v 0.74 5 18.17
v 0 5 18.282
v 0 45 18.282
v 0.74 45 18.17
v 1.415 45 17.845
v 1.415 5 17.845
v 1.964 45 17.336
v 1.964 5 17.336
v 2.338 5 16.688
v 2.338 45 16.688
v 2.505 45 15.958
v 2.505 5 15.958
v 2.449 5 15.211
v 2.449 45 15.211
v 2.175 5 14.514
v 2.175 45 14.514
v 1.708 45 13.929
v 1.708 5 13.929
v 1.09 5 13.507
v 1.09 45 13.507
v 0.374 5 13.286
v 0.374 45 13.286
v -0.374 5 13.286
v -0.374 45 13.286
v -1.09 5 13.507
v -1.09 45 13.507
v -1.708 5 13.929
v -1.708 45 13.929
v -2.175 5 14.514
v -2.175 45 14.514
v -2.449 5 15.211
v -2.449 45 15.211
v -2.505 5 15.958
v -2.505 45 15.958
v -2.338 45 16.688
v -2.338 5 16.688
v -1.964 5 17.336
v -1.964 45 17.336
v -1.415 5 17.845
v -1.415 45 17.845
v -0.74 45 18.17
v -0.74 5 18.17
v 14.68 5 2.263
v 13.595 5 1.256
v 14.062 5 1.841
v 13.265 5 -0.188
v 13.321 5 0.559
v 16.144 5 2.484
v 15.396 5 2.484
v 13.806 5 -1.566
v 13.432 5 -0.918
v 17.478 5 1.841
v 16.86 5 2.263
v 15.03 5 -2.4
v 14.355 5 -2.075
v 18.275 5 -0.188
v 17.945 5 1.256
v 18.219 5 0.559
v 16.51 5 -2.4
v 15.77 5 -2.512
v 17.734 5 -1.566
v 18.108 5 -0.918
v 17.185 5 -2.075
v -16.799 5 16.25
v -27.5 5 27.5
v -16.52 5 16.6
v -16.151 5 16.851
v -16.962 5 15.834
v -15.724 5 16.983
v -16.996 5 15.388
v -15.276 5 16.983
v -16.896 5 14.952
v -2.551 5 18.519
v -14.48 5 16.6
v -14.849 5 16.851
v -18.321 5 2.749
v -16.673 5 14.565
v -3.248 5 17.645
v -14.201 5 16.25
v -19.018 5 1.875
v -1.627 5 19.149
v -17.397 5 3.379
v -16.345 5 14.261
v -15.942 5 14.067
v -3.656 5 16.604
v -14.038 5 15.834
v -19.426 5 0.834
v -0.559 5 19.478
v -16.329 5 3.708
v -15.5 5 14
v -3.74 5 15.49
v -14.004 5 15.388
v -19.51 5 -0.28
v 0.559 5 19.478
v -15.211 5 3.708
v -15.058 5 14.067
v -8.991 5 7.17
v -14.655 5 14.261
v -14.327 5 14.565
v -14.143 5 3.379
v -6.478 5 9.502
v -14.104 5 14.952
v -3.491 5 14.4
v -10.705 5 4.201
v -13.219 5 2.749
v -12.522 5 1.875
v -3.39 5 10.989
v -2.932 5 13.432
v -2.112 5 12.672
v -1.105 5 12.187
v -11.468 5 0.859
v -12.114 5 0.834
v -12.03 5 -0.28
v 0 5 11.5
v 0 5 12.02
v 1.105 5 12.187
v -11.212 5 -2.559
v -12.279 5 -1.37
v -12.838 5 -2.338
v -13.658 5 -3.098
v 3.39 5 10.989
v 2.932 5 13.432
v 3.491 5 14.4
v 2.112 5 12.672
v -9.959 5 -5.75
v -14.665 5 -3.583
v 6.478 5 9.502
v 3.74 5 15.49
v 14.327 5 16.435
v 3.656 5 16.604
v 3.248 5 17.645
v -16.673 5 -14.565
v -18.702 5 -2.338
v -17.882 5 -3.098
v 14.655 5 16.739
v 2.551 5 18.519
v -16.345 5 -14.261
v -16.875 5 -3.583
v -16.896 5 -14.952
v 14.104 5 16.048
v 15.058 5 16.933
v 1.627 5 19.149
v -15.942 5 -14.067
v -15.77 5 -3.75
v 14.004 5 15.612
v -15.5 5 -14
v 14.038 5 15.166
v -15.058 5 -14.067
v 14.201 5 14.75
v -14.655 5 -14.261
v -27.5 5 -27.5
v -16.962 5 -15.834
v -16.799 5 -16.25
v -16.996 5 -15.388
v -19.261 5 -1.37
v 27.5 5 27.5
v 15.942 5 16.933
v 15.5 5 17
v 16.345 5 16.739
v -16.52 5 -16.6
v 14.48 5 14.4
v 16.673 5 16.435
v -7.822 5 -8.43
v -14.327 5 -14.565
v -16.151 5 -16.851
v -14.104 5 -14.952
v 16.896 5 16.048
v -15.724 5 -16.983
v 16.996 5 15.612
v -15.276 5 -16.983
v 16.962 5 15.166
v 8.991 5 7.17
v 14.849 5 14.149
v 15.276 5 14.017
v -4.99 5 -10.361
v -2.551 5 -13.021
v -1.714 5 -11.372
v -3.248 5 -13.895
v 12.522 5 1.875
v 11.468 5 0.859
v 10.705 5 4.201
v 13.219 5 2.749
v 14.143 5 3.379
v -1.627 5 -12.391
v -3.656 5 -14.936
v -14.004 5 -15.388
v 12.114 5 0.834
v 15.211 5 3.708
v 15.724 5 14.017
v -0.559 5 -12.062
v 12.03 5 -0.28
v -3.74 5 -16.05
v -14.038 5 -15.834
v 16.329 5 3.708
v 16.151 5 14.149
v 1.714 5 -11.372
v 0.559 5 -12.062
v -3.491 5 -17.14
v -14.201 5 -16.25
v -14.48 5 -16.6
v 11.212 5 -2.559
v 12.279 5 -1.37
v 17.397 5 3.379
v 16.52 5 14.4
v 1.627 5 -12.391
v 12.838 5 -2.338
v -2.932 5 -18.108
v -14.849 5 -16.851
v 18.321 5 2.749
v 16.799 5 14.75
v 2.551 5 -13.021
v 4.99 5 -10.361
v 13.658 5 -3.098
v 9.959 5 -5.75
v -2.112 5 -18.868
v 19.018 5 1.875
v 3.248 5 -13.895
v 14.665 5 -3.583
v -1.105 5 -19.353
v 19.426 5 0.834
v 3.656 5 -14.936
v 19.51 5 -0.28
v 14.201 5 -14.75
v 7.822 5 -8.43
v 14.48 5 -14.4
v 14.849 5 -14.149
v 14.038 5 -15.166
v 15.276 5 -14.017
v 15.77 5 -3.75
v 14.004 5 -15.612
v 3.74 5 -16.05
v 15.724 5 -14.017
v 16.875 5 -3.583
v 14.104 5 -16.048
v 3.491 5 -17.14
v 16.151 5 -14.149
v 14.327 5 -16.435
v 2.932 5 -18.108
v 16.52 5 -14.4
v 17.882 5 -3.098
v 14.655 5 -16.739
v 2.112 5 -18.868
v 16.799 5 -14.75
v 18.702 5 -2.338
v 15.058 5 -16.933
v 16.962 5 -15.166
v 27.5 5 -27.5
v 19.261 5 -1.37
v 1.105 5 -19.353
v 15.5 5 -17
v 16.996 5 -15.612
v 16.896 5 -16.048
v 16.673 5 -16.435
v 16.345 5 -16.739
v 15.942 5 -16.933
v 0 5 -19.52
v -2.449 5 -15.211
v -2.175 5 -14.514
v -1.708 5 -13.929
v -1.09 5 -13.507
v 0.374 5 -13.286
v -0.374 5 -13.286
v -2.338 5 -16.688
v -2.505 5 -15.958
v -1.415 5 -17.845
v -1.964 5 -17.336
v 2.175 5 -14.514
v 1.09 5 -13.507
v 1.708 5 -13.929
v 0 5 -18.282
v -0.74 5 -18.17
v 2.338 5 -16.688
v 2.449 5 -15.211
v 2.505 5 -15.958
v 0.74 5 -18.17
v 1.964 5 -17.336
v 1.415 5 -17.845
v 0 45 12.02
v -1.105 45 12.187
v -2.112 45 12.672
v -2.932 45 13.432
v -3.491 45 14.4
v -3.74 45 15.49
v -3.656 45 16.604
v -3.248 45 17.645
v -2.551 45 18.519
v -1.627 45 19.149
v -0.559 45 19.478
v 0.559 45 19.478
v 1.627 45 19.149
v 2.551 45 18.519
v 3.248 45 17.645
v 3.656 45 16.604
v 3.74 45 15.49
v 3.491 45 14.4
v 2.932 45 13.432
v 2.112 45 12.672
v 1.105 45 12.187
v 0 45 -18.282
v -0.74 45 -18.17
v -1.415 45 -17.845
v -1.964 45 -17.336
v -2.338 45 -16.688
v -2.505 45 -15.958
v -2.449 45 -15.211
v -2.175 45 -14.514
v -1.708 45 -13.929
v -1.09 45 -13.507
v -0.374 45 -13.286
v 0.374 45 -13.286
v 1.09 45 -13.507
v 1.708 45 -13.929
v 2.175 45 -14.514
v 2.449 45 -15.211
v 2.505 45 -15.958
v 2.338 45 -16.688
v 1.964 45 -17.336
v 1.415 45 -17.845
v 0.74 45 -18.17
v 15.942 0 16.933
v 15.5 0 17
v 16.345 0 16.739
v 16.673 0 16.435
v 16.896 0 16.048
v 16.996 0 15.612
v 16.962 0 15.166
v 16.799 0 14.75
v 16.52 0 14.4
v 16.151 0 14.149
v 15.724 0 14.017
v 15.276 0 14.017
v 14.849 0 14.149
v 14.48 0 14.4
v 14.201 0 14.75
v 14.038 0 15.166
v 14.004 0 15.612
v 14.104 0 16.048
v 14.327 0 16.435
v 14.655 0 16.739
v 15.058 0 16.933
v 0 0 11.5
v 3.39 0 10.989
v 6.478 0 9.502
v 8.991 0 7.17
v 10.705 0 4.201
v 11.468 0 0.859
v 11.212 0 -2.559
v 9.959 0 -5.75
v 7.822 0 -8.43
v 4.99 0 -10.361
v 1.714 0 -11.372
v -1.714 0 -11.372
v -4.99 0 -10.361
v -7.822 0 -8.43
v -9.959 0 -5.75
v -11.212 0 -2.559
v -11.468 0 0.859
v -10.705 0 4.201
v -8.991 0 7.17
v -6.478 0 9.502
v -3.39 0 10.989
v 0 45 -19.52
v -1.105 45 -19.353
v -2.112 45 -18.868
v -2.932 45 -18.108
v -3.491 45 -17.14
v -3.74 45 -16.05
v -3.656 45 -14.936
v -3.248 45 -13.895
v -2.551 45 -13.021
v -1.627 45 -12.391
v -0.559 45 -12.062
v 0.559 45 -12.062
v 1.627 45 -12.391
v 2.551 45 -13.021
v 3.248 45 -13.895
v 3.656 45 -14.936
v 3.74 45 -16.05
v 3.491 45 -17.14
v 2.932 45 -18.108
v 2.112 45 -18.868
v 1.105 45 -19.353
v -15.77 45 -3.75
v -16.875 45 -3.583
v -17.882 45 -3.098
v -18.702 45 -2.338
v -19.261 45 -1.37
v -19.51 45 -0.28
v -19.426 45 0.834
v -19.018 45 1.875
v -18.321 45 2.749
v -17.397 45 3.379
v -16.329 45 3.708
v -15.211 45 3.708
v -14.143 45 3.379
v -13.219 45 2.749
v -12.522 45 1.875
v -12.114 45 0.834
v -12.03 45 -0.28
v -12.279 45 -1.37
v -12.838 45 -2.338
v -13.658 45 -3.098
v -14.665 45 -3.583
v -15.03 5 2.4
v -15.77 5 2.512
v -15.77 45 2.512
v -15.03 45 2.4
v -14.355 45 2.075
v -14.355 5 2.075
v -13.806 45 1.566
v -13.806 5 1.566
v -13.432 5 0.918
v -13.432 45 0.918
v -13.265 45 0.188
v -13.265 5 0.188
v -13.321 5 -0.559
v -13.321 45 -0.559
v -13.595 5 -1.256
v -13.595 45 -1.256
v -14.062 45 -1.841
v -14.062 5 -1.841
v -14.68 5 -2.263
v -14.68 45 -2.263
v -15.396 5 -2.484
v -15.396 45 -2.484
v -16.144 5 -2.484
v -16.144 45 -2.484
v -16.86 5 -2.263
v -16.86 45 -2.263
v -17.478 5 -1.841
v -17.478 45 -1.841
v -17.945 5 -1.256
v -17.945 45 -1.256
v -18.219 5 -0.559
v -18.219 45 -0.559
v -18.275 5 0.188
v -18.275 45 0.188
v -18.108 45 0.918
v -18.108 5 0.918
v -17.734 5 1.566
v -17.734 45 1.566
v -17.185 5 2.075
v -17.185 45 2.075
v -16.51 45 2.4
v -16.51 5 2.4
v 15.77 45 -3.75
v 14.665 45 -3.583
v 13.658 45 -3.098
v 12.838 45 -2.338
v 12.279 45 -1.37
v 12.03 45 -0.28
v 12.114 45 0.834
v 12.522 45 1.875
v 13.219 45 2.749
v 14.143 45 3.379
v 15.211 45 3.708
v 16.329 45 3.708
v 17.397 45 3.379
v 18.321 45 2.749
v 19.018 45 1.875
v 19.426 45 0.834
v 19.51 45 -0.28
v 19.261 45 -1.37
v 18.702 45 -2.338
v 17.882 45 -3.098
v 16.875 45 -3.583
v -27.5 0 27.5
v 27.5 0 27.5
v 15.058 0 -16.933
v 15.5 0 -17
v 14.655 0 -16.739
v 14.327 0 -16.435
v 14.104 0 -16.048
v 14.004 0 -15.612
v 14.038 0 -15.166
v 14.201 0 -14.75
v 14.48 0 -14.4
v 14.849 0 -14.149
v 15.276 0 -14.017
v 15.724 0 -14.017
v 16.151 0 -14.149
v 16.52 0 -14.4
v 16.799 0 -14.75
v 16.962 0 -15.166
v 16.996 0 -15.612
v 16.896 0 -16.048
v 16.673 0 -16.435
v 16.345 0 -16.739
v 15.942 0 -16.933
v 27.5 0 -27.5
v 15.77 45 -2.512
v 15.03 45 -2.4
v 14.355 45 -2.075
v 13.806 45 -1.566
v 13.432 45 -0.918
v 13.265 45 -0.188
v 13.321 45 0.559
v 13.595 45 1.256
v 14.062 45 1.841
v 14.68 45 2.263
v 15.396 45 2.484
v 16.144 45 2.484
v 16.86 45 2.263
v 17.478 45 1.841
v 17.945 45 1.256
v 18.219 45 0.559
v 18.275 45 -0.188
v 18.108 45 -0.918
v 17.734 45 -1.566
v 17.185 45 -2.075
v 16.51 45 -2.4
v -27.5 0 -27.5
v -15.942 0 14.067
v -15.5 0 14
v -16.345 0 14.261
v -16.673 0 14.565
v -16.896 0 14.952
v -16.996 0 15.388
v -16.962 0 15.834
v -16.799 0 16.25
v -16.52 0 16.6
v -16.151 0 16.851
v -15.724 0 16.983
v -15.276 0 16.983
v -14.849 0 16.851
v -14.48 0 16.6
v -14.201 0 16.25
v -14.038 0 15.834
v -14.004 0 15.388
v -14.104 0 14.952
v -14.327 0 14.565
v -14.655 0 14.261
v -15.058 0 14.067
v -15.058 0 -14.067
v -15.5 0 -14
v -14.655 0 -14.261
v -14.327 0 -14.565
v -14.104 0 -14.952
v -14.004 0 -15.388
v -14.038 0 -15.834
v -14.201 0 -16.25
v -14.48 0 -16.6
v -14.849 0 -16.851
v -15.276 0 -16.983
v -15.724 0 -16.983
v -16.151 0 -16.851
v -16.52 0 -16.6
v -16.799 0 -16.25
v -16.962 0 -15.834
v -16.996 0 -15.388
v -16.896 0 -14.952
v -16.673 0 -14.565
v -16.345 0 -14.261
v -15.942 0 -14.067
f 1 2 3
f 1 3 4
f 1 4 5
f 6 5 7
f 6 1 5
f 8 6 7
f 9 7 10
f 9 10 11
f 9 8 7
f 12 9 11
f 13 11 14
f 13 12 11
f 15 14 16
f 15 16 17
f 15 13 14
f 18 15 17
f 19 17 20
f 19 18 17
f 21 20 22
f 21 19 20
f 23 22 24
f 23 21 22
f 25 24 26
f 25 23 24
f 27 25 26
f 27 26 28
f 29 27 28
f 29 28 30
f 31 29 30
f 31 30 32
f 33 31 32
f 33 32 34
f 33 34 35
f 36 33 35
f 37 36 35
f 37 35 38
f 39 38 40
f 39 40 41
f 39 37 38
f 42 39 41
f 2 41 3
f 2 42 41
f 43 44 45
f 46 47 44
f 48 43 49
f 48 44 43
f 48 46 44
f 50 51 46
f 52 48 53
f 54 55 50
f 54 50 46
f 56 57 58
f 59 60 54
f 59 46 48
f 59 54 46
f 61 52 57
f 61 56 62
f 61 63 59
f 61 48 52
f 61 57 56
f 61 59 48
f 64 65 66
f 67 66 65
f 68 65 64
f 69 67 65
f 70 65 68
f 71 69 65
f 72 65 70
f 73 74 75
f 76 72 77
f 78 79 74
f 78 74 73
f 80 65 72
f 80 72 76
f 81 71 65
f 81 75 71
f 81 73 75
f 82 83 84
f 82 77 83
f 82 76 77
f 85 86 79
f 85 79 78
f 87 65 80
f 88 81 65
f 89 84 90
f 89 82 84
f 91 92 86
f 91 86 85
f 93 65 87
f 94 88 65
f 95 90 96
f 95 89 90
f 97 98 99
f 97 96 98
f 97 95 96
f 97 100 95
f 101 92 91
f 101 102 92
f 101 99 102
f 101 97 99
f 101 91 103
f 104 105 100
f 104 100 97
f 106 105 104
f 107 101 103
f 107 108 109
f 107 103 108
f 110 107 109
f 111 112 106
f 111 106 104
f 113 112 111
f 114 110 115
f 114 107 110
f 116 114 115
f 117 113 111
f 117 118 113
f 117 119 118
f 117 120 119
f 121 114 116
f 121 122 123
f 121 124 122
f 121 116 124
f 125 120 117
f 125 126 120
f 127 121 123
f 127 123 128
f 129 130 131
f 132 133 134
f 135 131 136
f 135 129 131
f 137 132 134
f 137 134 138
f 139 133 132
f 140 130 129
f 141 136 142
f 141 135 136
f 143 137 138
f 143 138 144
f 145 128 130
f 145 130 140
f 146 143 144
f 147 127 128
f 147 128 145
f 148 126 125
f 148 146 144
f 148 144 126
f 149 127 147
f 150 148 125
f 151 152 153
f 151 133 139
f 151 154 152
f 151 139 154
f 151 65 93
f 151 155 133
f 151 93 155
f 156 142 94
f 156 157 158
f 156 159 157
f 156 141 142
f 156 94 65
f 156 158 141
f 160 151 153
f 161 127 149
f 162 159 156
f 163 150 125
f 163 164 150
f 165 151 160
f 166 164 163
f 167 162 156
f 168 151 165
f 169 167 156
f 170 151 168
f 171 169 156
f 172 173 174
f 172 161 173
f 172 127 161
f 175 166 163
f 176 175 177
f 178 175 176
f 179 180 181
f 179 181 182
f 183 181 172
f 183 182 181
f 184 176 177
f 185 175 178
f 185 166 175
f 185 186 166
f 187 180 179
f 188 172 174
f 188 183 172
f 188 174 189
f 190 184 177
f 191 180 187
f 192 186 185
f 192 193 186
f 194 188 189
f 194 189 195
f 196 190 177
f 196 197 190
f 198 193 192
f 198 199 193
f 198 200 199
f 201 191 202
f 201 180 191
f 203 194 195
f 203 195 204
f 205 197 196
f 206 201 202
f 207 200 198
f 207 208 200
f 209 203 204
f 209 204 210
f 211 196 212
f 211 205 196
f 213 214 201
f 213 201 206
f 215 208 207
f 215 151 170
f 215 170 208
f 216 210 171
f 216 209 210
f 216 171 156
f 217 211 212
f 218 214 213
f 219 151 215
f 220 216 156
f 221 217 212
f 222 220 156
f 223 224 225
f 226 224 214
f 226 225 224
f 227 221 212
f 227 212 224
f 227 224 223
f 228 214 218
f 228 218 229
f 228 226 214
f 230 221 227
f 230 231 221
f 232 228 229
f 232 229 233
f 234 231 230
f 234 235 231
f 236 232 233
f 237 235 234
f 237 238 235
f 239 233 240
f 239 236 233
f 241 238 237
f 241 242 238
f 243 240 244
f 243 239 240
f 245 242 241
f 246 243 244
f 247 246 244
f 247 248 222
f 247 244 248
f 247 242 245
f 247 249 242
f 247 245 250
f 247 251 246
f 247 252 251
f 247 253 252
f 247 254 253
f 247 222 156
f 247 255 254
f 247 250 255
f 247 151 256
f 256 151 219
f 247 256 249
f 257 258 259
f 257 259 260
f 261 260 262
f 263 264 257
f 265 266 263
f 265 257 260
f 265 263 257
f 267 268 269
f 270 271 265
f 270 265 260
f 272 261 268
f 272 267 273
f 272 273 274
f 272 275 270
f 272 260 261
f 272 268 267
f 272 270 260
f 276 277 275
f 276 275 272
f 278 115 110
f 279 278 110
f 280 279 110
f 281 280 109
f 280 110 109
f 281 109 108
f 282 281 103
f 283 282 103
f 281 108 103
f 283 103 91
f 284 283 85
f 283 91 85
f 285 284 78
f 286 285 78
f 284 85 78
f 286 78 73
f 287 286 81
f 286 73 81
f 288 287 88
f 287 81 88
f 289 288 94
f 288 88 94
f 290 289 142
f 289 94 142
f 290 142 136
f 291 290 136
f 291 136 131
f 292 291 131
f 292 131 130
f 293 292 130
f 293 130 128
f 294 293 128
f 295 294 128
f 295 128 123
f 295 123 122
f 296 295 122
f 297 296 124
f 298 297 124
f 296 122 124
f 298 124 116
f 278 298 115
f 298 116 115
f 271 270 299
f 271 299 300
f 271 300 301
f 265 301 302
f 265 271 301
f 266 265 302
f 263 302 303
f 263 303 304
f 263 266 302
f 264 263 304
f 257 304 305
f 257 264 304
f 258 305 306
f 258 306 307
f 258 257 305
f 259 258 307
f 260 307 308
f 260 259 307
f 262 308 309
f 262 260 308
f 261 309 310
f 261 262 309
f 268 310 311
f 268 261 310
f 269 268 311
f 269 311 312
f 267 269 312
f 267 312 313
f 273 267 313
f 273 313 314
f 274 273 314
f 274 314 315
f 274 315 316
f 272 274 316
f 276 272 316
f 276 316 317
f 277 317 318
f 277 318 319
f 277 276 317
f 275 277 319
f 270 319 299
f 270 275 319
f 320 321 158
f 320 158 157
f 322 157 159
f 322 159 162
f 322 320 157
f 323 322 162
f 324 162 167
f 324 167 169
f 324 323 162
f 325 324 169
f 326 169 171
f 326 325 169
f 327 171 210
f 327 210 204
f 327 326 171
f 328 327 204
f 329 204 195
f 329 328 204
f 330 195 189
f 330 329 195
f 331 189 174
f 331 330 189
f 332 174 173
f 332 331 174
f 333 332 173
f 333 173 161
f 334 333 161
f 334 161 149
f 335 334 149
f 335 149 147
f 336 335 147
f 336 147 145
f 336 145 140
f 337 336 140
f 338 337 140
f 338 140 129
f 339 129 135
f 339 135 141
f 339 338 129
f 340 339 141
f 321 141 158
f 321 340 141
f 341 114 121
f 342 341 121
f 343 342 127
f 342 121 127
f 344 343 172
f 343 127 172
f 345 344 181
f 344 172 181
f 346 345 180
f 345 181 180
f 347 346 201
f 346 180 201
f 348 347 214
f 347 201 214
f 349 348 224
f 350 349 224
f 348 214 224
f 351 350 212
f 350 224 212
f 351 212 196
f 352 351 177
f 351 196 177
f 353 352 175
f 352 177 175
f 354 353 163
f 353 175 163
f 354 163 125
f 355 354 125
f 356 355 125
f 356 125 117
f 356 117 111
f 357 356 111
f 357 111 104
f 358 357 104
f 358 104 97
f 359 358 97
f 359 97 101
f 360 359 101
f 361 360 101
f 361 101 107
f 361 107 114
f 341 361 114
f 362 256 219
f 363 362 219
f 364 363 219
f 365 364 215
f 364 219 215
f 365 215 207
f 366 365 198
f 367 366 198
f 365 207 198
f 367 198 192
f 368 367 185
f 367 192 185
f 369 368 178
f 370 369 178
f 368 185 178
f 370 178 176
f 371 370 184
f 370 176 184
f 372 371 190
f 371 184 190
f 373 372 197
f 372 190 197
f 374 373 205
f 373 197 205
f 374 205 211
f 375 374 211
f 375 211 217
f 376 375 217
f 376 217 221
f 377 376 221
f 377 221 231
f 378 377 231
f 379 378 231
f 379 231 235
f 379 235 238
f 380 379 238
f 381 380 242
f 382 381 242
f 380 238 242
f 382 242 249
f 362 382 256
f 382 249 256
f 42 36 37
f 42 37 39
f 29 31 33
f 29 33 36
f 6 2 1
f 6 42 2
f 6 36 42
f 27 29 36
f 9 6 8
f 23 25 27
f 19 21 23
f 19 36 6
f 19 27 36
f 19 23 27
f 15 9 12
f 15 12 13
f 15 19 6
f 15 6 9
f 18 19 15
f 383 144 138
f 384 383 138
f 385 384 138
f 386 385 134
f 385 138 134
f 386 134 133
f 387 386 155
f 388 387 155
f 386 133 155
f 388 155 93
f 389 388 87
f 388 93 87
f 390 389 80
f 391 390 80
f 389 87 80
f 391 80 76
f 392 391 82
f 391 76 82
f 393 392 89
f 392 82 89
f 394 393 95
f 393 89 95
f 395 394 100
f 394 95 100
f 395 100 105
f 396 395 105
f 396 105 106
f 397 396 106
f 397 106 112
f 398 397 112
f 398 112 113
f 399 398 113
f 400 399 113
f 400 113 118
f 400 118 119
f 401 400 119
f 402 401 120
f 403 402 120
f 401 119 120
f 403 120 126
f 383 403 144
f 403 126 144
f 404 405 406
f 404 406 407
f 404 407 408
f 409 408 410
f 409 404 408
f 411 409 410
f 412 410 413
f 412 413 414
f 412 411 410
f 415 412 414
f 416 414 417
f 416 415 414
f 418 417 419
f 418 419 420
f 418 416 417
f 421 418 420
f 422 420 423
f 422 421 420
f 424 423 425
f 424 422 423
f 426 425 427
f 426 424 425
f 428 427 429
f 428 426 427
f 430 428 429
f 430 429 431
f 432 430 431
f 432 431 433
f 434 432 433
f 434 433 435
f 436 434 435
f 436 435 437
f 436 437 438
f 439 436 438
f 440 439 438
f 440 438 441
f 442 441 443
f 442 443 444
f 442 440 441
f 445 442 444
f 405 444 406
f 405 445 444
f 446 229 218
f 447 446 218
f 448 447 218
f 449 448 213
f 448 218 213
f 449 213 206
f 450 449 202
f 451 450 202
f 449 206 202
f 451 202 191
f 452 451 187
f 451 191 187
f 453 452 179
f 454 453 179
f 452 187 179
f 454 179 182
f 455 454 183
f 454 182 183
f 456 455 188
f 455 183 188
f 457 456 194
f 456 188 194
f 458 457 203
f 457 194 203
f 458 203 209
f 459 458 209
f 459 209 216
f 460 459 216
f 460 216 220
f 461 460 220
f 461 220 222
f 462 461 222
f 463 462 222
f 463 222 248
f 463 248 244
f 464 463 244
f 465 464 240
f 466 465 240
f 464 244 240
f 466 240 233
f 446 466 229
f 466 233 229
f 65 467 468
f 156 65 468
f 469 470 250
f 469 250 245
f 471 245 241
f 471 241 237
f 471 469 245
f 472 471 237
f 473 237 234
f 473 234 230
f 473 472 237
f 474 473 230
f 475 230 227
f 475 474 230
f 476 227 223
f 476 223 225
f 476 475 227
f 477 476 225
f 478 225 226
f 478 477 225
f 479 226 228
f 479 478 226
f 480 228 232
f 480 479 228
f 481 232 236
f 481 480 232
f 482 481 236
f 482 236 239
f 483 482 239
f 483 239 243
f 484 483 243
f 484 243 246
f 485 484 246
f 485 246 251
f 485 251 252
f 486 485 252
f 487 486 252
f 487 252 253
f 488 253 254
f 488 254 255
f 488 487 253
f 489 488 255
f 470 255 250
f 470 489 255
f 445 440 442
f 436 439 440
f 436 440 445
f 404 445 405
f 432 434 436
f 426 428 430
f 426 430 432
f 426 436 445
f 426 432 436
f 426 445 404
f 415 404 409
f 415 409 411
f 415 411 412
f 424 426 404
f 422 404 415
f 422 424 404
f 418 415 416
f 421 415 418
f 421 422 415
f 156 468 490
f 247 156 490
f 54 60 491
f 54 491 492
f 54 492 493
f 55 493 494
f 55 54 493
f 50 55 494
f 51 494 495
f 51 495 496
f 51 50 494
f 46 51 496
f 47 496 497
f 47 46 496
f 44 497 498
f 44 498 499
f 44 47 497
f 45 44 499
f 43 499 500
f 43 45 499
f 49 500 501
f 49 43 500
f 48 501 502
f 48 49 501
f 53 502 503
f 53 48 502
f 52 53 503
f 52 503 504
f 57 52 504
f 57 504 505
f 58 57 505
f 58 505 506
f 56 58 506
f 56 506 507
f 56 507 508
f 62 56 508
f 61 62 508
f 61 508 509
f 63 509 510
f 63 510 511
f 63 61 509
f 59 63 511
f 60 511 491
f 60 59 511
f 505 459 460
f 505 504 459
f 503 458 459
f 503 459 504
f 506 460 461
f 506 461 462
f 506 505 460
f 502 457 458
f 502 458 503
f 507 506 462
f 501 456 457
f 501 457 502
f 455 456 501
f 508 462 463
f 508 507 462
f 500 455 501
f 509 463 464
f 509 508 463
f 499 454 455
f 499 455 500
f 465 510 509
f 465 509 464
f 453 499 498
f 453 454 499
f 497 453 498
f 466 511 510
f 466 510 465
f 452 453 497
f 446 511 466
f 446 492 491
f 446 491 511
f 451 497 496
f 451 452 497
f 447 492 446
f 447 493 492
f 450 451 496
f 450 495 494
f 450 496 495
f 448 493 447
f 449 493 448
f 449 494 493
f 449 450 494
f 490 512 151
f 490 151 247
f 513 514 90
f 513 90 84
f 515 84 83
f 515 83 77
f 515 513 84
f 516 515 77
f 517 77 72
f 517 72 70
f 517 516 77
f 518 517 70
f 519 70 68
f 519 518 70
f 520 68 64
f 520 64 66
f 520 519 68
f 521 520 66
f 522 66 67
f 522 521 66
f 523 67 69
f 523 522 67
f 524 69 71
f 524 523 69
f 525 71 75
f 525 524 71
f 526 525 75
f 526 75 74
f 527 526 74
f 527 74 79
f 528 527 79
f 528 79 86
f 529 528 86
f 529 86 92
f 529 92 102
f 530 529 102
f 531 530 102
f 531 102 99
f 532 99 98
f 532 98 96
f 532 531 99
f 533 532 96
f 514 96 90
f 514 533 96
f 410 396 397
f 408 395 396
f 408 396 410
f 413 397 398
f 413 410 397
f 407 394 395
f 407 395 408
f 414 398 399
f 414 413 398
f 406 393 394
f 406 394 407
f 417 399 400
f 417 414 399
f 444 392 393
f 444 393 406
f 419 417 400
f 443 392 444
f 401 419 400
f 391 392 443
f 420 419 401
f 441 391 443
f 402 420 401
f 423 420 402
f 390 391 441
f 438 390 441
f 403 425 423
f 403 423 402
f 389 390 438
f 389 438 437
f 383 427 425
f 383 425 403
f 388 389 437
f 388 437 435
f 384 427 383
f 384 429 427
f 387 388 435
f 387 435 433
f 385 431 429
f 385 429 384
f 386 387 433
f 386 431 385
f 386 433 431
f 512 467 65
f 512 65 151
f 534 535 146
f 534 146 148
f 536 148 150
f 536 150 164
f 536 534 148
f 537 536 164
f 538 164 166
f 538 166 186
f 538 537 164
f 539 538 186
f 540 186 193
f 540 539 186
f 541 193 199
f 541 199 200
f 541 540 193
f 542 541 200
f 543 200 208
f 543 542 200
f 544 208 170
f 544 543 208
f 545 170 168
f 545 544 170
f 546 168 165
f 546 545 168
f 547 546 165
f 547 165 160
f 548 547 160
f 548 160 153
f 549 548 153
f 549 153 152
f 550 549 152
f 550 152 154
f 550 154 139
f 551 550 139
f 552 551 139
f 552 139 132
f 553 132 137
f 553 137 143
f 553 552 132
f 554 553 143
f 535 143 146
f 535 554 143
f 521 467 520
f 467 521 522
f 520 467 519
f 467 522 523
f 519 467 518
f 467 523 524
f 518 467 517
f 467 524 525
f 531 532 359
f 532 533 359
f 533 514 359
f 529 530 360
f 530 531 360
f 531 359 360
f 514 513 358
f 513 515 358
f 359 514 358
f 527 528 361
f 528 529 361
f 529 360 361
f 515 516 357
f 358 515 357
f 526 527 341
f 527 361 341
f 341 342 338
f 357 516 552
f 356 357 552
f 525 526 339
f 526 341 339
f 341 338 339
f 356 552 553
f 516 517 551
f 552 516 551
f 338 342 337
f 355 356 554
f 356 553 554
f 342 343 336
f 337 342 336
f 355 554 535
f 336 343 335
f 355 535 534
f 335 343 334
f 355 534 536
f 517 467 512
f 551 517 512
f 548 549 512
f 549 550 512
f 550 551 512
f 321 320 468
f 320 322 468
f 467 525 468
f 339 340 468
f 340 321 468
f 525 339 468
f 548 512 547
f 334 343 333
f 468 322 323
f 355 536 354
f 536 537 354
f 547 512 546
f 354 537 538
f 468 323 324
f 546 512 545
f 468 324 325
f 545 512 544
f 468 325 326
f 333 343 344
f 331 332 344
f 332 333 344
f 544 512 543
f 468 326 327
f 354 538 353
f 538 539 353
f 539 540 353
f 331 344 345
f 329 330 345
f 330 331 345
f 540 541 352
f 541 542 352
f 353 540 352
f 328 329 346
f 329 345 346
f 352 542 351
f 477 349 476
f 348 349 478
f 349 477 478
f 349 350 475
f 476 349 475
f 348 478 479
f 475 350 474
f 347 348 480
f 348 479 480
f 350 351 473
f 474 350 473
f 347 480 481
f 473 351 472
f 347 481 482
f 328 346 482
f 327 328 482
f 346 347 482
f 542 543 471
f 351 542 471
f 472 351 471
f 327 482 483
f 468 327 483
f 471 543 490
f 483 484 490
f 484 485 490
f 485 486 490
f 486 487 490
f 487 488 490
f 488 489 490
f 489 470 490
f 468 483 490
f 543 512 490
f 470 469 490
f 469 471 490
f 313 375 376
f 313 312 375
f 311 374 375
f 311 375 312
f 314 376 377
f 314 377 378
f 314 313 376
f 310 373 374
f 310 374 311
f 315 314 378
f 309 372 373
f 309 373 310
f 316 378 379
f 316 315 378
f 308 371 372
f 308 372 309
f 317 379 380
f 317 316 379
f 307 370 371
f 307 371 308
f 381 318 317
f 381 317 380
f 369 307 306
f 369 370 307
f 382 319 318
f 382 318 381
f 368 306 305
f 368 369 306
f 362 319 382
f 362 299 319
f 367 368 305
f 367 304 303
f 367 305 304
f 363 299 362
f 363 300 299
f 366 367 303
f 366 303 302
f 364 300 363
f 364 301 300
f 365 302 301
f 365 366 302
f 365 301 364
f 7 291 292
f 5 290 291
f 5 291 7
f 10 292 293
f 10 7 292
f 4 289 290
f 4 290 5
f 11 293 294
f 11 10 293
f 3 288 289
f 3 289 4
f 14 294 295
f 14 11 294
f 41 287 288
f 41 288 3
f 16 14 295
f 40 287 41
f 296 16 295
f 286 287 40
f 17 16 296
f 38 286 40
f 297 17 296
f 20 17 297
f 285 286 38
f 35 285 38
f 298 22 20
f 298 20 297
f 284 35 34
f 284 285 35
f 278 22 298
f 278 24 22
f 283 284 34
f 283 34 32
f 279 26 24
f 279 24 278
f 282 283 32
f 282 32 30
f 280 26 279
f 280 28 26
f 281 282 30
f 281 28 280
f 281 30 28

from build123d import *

# Parameters (mm, degrees)
SKETCH1_W           = 55
SKETCH1_H           = 55
SKETCH1_R           = 1.5
BOSS_EXTRUDE1_DEPTH = 5
SKETCH2_R           = 3.75
SKETCH2_R_2         = 2.51184584
BOSS_EXTRUDE2_DEPTH = 40
SKETCH3_R           = 11.5
CUT_EXTRUDE1_DEPTH  = 15


with BuildPart() as part:
    # Sketch1 → Boss-Extrude1 (new body)
    with BuildSketch(Plane(origin=(0, 0, 0), x_dir=(1, 0, 0), z_dir=(0, 1, 0))):
        Rectangle(SKETCH1_W, SKETCH1_H)
        with Locations(Location((-15.5, 15.5, 0), (0, 0, 270))):
            Circle(SKETCH1_R, mode=Mode.SUBTRACT)
        with Locations(Location((-15.5, -15.5, 0), (0, 0, 90))):
            Circle(SKETCH1_R, mode=Mode.SUBTRACT)
        with Locations(Location((15.5, -15.5, 0), (0, 0, 270))):
            Circle(SKETCH1_R, mode=Mode.SUBTRACT)
        with Locations(Location((15.5, 15.5, 0), (0, 0, 90))):
            Circle(SKETCH1_R, mode=Mode.SUBTRACT)
    extrude(amount=BOSS_EXTRUDE1_DEPTH)

    # Sketch2 → Boss-Extrude2 (add)
    # profile 1 of 4: a face of its own
    with BuildSketch(Plane(origin=(0, 5, 0), x_dir=(1, 0, 0), z_dir=(0, 1, 0))):
        with Locations(Location((-15.77, 0, 0), (0, 0, 90))):
            Circle(SKETCH2_R)
        with Locations(Location((-15.77, 0, 0), (0, 0, 270))):
            Circle(SKETCH2_R_2, mode=Mode.SUBTRACT)
    # profile 2 of 4: a face of its own
    with BuildSketch(Plane(origin=(0, 5, 0), x_dir=(1, 0, 0), z_dir=(0, 1, 0))):
        with Locations(Location((15.77, 0, 0), (0, 0, 90))):
            Circle(SKETCH2_R)
        with Locations(Location((15.77, 0, 0), (0, 0, 90))):
            Circle(SKETCH2_R_2, mode=Mode.SUBTRACT)
    # profile 3 of 4: a face of its own
    with BuildSketch(Plane(origin=(0, 5, 0), x_dir=(1, 0, 0), z_dir=(0, 1, 0))):
        with Locations(Location((0, -15.77, 0), (0, 0, 90))):
            Circle(SKETCH2_R)
        with Locations(Location((0, -15.77, 0), (0, 0, 270))):
            Circle(SKETCH2_R_2, mode=Mode.SUBTRACT)
    # profile 4 of 4: a face of its own
    with BuildSketch(Plane(origin=(0, 5, 0), x_dir=(1, 0, 0), z_dir=(0, 1, 0))):
        with Locations(Location((0, 15.77, 0), (0, 0, 90))):
            Circle(SKETCH2_R)
        with Locations(Location((0, 15.77, 0), (0, 0, 90))):
            Circle(SKETCH2_R_2, mode=Mode.SUBTRACT)
    extrude(amount=BOSS_EXTRUDE2_DEPTH)

    # Sketch3 → Cut-Extrude1 (cut)
    with BuildSketch(Plane(origin=(0, 5, 0), x_dir=(1, 0, 0), z_dir=(0, 1, 0))):
        with Locations(Location((0, 0, 0), (0, 0, 270))):
            Circle(SKETCH3_R)
    extrude(amount=-CUT_EXTRUDE1_DEPTH, mode=Mode.SUBTRACT)


solid = part.part
